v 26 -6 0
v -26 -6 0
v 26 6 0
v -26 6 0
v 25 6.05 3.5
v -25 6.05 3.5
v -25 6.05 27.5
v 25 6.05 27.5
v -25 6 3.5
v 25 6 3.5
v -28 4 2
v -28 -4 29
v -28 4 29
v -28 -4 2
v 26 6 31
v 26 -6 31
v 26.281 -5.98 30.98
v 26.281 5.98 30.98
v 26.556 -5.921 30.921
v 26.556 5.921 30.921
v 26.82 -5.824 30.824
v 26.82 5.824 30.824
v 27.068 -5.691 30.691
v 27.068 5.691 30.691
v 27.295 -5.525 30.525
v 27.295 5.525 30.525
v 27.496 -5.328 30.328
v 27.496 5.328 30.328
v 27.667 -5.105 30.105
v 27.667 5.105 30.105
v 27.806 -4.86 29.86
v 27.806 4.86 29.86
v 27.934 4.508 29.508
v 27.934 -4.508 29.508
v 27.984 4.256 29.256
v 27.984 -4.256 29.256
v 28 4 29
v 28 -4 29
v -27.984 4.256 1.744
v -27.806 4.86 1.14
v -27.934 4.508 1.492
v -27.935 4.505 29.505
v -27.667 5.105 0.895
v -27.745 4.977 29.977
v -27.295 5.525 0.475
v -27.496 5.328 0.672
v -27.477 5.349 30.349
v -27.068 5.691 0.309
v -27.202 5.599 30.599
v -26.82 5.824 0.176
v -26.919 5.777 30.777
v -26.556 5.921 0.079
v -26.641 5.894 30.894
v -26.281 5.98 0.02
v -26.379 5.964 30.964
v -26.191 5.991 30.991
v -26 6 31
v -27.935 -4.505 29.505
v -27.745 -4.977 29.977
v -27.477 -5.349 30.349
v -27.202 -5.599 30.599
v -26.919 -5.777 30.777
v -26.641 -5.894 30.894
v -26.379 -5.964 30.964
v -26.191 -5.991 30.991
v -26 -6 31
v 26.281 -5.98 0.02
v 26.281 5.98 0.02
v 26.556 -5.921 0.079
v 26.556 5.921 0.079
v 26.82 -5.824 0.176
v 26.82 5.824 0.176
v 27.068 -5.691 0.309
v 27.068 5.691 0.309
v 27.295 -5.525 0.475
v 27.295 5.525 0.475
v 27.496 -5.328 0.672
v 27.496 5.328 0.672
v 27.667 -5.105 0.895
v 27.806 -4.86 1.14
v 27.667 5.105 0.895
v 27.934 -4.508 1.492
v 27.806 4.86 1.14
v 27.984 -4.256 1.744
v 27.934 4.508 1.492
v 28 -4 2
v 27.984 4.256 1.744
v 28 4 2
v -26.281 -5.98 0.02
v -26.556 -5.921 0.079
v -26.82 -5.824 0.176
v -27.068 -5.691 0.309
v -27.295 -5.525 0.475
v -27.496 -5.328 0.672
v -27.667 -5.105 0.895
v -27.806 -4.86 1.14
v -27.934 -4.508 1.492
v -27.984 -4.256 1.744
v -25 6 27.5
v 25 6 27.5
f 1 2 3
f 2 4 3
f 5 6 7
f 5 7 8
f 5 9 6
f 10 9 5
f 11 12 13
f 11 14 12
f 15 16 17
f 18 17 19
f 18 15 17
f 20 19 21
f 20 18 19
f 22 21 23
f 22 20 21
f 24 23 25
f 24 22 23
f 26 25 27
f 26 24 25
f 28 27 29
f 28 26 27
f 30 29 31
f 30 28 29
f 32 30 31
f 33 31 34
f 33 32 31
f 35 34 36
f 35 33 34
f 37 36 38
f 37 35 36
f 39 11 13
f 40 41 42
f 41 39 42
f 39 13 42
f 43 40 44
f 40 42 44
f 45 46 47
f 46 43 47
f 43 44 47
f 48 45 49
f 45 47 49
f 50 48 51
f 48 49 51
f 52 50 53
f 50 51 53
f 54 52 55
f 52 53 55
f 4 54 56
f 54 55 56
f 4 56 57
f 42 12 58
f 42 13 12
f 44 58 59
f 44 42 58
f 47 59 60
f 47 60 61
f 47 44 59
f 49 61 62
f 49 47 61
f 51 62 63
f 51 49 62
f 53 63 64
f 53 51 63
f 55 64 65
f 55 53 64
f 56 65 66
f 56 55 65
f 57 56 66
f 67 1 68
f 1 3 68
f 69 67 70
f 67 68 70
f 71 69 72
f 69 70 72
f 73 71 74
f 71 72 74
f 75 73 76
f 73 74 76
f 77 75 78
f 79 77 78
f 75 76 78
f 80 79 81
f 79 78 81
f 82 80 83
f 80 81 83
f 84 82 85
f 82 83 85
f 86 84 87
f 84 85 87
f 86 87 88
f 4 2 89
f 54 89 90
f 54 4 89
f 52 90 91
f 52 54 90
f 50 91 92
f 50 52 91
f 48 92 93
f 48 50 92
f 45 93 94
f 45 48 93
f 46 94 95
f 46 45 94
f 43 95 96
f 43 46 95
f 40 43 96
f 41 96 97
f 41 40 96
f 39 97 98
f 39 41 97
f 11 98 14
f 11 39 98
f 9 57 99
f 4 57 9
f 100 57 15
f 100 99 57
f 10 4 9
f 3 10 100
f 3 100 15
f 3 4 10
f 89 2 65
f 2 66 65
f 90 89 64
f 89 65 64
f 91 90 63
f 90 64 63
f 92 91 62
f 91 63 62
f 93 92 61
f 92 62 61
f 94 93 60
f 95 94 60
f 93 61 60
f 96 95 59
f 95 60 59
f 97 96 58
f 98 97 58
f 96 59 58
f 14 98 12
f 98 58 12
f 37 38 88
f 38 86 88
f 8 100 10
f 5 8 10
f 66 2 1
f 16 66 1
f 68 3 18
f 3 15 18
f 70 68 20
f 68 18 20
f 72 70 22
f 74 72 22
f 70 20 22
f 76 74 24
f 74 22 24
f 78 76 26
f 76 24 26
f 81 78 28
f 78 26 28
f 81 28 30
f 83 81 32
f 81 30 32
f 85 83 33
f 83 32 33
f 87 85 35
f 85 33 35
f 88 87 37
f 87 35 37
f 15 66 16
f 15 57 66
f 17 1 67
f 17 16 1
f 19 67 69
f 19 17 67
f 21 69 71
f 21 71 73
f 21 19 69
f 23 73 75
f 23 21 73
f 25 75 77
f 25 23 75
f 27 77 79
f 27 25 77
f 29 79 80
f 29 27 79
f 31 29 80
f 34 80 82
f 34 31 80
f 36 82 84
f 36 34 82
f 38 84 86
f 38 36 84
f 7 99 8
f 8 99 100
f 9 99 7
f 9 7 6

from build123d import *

# Parameters (mm, degrees)
ESBO_O1_W                = 56
ESBO_O1_H                = 12
RESSALTO_EXTRUS_O3_DEPTH = 31
ESBO_O7_W                = 50
ESBO_O7_H                = 24
RESSALTO_EXTRUS_O4_DEPTH = 0.05
FILETE2_R                = 2
FILETE3_R                = 2


with BuildPart() as part:
    # Esboço1 → Ressalto-extrusão3 (new body)
    with BuildSketch(Plane.XY):
        Rectangle(ESBO_O1_W, ESBO_O1_H)
    extrude(amount=RESSALTO_EXTRUS_O3_DEPTH)

    # Esboço7 → Ressalto-extrusão4 (add)
    with BuildSketch(Plane(origin=(0, 6, 0), x_dir=(1, 0, 0), z_dir=(0, 1, 0))):
        with Locations((0, -15.5)):
            Rectangle(ESBO_O7_W, ESBO_O7_H)
    extrude(amount=RESSALTO_EXTRUS_O4_DEPTH)

    # Filete2
    filete2_edges = [part.edges().sort_by_distance(p)[0] for p in [
        (28, 0, 31),
        (28, 0, 0),
        (28, -6, 15.5),
        (28, 6, 15.5),
    ]]
    fillet(filete2_edges, radius=FILETE2_R)

    # Filete3
    filete3_edges = [part.edges().sort_by_distance(p)[0] for p in [
        (-28, 0, 31),
        (-28, 0, 0),
        (-28, -6, 15.5),
        (-28, 6, 15.5),
    ]]
    fillet(filete3_edges, radius=FILETE3_R)


solid = part.part
